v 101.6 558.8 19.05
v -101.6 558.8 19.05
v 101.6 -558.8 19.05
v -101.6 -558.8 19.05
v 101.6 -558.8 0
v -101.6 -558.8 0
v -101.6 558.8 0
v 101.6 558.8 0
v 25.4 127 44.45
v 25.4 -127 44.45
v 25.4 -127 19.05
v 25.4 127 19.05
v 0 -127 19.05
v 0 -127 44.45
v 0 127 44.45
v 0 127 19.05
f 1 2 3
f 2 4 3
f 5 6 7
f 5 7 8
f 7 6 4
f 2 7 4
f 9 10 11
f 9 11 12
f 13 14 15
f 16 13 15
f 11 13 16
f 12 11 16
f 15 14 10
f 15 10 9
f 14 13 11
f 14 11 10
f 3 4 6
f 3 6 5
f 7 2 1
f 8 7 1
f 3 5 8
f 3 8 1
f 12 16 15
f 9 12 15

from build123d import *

# Parameters (mm, degrees)
F0_W     = 203.2
F0_H     = 19.05
F1_DEPTH = 558.8
F2_W     = 254
F2_H     = 25.4
F3_DEPTH = 25.4


with BuildPart() as f1:
    # F0 (on Front) → F1 (new body, symmetric)
    with BuildSketch(Plane.XZ):
        with Locations((0, 9.525)):
            Rectangle(F0_W, F0_H)
    extrude(amount=F1_DEPTH, both=True)


with BuildPart() as f3:
    # F2 (on Right) → F3 (new body)
    with BuildSketch(Plane.YZ):
        with Locations((0, 31.75)):
            Rectangle(F2_W, F2_H)
    extrude(amount=F3_DEPTH)


solid = Compound([f1.part, f3.part])
